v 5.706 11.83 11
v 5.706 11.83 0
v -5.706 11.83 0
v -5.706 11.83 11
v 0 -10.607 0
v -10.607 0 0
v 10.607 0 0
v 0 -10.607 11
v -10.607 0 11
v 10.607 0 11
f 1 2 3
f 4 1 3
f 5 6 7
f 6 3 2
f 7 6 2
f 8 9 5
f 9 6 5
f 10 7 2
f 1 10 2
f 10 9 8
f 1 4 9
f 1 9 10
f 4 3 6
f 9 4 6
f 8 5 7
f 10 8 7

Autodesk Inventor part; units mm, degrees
ref_plane "YZ Plane" through (0, 0, 0) normal (1, 0, 0) x (0, 1, 0)
ref_plane "XZ Plane" through (0, 0, 0) normal (0, 1, 0) x (-1, 0, 0)
ref_plane "XY Plane" through (0, 0, 0) normal (0, 0, 1) x (1, 0, 0)
sketch "Sketch1" plane through (0, 0, 0) normal (0, 0, 1) x (1, 0, 0)
  line L0 (5.3033, -5.3033) -> (0, 0) construction
  line L1 (0, 0) -> (-5.3033, -5.3033) construction
  line L2 (0, -10.6066) -> (10.6066, 0)
  line L3 (10.6066, 0) -> (5.7063, 11.8303)
  line L4 (5.7063, 11.8303) -> (-5.7063, 11.8303)
  line L5 (-5.7063, 11.8303) -> (-10.6066, 0)
  line L6 (-10.6066, 0) -> (0, -10.6066)
  line L7 (0, -10.6066) -> (0, 11.8303) construction
  dimension "d0" = 90
  dimension "d1" = 112.5
  dimension "d2" = 112.5
  dimension "d3" = 112.5
  dimension "d4" = 15
  dimension "d5" = 12.805
extrude "Extrusion1" add sketch "Sketch1" along normal blind 11
equation "\"d2\" = d1"
equation "\"d3\" = d1"
properties part number "Prisma-90" material "Glass"
